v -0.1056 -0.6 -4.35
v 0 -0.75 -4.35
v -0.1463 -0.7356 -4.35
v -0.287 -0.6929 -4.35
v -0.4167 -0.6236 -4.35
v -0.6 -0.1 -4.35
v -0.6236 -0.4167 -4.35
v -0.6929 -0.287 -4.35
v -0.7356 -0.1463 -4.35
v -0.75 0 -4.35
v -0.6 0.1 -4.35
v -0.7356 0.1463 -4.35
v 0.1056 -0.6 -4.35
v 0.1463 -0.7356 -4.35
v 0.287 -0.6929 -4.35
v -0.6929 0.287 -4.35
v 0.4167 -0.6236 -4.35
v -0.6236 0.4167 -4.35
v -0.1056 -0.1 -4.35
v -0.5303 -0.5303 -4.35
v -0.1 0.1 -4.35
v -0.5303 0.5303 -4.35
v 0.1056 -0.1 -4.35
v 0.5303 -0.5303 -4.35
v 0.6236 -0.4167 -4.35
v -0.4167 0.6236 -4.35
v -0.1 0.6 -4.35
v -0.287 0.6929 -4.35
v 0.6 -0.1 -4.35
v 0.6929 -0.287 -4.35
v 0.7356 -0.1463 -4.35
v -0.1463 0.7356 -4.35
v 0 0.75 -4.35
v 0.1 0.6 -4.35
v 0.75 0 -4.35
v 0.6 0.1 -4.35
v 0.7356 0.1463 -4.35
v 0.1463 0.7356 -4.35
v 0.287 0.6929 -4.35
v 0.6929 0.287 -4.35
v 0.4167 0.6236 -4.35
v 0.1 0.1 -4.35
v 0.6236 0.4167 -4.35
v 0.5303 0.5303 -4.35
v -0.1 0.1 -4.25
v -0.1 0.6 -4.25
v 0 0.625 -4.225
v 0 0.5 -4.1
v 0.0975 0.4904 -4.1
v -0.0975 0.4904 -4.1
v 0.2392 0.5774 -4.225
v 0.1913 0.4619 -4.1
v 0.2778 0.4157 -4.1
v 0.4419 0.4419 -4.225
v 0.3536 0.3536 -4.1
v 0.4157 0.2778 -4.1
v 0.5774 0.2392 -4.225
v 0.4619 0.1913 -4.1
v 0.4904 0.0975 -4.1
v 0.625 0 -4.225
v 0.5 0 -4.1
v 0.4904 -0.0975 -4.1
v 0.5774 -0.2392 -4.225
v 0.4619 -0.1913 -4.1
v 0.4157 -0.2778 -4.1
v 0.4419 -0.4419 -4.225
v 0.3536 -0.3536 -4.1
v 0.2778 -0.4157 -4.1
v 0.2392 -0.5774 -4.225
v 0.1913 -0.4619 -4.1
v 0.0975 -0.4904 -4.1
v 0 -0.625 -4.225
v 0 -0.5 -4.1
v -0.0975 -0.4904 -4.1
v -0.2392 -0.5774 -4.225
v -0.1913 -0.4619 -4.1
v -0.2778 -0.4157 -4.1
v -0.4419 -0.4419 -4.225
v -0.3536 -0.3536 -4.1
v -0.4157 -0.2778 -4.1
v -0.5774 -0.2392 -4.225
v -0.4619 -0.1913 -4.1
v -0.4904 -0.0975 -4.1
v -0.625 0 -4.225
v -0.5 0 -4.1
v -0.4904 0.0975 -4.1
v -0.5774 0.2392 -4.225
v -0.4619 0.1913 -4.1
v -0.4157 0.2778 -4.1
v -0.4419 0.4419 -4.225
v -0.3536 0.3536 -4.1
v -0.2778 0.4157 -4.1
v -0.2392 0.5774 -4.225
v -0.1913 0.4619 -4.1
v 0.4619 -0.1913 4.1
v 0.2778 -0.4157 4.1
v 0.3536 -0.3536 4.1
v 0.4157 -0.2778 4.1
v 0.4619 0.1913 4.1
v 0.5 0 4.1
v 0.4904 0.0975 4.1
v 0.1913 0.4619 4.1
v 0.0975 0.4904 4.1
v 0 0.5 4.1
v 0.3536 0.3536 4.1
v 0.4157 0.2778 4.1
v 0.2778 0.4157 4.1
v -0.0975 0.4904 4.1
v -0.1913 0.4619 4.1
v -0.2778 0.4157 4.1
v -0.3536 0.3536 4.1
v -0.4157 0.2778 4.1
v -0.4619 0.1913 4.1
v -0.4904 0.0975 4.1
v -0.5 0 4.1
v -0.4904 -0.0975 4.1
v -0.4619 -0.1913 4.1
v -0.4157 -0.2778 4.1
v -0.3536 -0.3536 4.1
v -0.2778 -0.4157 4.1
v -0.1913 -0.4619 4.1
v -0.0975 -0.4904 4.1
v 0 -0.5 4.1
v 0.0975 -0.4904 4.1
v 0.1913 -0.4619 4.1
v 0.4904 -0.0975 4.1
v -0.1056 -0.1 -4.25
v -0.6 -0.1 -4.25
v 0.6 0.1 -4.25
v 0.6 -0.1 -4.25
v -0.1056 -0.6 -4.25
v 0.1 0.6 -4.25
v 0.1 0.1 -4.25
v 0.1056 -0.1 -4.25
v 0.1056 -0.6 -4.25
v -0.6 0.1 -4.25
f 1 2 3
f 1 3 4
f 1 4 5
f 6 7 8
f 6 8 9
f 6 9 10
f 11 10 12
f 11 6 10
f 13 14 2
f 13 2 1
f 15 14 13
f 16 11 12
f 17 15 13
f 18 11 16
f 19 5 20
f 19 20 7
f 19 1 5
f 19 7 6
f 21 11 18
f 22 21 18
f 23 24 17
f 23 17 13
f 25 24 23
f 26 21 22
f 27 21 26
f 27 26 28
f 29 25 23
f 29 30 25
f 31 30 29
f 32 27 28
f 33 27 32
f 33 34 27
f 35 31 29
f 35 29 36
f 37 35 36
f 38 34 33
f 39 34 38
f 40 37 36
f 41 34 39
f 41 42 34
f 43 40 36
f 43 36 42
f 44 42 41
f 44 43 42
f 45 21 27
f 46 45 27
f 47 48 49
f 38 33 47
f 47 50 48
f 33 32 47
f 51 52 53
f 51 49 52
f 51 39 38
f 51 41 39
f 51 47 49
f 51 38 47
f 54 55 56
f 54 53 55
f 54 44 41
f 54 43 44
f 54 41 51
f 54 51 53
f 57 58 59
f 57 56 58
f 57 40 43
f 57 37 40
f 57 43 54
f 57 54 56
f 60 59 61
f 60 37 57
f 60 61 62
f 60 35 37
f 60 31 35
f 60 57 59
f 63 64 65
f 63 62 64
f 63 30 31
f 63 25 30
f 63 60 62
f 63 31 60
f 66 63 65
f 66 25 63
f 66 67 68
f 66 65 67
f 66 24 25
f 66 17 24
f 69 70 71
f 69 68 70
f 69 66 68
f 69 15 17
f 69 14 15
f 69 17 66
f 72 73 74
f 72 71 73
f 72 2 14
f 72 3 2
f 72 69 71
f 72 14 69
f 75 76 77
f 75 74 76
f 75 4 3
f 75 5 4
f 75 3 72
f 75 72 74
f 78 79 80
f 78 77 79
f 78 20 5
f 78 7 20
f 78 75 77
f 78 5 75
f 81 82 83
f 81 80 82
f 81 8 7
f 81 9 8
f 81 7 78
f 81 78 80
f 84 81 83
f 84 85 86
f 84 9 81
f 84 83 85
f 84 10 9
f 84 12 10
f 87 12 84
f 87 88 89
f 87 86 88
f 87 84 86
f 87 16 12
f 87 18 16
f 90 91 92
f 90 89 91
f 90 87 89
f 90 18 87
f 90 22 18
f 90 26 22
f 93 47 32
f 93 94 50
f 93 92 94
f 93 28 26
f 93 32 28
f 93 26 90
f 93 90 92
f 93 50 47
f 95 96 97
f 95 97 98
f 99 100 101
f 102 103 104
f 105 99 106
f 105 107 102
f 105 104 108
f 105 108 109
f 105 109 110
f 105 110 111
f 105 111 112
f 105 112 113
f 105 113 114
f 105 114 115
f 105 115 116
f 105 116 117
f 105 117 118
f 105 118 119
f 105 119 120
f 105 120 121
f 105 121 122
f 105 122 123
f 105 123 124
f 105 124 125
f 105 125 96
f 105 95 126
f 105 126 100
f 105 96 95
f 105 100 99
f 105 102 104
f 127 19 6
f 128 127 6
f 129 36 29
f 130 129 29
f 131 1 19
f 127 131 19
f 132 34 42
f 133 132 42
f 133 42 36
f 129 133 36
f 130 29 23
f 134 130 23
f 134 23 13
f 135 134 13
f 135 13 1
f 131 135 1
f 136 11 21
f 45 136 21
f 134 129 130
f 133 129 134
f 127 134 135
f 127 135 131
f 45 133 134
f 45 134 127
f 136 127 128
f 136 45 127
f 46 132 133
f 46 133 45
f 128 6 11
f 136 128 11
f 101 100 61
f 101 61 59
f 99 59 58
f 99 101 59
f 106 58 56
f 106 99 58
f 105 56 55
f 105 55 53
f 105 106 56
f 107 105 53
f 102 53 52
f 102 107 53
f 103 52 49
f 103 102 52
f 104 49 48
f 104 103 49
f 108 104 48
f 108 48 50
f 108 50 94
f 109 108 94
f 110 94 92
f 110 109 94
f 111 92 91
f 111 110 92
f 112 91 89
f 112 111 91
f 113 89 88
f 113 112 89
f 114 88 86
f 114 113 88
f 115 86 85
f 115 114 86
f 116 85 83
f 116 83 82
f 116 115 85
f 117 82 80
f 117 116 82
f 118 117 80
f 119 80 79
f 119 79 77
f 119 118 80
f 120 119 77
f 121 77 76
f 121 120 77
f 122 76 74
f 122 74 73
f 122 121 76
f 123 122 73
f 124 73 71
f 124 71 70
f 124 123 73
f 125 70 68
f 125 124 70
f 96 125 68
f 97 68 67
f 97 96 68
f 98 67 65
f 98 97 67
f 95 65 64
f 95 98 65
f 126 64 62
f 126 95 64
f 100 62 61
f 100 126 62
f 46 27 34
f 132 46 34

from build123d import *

# Parameters (mm, degrees)
SKETCH1_R           = 0.5
BOSS_EXTRUDE1_DEPTH = 4.1
CUT_EXTRUDE1_DEPTH  = 0.1


with BuildPart() as part:
    # Sketch1 → Boss-Extrude1 (new body, symmetric)
    with BuildSketch(Plane.XY):
        Circle(SKETCH1_R)
    extrude(amount=BOSS_EXTRUDE1_DEPTH, both=True)

    # Sketch2 → Revolve1 (revolve)
    with BuildSketch(Plane(origin=(0, 0, 0), x_dir=(0, 0, -1), z_dir=(1, 0, 0))):
        Polygon((4.35, 0.75), (4.35, 0), (4.1, 0), (4.1, 0.5), align=None)
    revolve(axis=Axis((0, 0, 2.0805), (0, 0, -1)))

    # Sketch3 → Cut-Extrude1 (cut)
    with BuildSketch(Plane(origin=(0, 0, -4.35), x_dir=(-1, 0, 0), z_dir=(0, 0, -1))):
        Polygon((0.1, 0.6), (-0.1, 0.6), (-0.1, 0.1), (-0.6, 0.1), (-0.6, -0.1), (-0.105645494, -0.1), (-0.105645494, -0.6), (0.105645494, -0.6), (0.105645494, -0.1), (0.6, -0.1), (0.6, 0.1), (0.1, 0.1), align=None)
    extrude(amount=-CUT_EXTRUDE1_DEPTH, mode=Mode.SUBTRACT)


solid = part.part
